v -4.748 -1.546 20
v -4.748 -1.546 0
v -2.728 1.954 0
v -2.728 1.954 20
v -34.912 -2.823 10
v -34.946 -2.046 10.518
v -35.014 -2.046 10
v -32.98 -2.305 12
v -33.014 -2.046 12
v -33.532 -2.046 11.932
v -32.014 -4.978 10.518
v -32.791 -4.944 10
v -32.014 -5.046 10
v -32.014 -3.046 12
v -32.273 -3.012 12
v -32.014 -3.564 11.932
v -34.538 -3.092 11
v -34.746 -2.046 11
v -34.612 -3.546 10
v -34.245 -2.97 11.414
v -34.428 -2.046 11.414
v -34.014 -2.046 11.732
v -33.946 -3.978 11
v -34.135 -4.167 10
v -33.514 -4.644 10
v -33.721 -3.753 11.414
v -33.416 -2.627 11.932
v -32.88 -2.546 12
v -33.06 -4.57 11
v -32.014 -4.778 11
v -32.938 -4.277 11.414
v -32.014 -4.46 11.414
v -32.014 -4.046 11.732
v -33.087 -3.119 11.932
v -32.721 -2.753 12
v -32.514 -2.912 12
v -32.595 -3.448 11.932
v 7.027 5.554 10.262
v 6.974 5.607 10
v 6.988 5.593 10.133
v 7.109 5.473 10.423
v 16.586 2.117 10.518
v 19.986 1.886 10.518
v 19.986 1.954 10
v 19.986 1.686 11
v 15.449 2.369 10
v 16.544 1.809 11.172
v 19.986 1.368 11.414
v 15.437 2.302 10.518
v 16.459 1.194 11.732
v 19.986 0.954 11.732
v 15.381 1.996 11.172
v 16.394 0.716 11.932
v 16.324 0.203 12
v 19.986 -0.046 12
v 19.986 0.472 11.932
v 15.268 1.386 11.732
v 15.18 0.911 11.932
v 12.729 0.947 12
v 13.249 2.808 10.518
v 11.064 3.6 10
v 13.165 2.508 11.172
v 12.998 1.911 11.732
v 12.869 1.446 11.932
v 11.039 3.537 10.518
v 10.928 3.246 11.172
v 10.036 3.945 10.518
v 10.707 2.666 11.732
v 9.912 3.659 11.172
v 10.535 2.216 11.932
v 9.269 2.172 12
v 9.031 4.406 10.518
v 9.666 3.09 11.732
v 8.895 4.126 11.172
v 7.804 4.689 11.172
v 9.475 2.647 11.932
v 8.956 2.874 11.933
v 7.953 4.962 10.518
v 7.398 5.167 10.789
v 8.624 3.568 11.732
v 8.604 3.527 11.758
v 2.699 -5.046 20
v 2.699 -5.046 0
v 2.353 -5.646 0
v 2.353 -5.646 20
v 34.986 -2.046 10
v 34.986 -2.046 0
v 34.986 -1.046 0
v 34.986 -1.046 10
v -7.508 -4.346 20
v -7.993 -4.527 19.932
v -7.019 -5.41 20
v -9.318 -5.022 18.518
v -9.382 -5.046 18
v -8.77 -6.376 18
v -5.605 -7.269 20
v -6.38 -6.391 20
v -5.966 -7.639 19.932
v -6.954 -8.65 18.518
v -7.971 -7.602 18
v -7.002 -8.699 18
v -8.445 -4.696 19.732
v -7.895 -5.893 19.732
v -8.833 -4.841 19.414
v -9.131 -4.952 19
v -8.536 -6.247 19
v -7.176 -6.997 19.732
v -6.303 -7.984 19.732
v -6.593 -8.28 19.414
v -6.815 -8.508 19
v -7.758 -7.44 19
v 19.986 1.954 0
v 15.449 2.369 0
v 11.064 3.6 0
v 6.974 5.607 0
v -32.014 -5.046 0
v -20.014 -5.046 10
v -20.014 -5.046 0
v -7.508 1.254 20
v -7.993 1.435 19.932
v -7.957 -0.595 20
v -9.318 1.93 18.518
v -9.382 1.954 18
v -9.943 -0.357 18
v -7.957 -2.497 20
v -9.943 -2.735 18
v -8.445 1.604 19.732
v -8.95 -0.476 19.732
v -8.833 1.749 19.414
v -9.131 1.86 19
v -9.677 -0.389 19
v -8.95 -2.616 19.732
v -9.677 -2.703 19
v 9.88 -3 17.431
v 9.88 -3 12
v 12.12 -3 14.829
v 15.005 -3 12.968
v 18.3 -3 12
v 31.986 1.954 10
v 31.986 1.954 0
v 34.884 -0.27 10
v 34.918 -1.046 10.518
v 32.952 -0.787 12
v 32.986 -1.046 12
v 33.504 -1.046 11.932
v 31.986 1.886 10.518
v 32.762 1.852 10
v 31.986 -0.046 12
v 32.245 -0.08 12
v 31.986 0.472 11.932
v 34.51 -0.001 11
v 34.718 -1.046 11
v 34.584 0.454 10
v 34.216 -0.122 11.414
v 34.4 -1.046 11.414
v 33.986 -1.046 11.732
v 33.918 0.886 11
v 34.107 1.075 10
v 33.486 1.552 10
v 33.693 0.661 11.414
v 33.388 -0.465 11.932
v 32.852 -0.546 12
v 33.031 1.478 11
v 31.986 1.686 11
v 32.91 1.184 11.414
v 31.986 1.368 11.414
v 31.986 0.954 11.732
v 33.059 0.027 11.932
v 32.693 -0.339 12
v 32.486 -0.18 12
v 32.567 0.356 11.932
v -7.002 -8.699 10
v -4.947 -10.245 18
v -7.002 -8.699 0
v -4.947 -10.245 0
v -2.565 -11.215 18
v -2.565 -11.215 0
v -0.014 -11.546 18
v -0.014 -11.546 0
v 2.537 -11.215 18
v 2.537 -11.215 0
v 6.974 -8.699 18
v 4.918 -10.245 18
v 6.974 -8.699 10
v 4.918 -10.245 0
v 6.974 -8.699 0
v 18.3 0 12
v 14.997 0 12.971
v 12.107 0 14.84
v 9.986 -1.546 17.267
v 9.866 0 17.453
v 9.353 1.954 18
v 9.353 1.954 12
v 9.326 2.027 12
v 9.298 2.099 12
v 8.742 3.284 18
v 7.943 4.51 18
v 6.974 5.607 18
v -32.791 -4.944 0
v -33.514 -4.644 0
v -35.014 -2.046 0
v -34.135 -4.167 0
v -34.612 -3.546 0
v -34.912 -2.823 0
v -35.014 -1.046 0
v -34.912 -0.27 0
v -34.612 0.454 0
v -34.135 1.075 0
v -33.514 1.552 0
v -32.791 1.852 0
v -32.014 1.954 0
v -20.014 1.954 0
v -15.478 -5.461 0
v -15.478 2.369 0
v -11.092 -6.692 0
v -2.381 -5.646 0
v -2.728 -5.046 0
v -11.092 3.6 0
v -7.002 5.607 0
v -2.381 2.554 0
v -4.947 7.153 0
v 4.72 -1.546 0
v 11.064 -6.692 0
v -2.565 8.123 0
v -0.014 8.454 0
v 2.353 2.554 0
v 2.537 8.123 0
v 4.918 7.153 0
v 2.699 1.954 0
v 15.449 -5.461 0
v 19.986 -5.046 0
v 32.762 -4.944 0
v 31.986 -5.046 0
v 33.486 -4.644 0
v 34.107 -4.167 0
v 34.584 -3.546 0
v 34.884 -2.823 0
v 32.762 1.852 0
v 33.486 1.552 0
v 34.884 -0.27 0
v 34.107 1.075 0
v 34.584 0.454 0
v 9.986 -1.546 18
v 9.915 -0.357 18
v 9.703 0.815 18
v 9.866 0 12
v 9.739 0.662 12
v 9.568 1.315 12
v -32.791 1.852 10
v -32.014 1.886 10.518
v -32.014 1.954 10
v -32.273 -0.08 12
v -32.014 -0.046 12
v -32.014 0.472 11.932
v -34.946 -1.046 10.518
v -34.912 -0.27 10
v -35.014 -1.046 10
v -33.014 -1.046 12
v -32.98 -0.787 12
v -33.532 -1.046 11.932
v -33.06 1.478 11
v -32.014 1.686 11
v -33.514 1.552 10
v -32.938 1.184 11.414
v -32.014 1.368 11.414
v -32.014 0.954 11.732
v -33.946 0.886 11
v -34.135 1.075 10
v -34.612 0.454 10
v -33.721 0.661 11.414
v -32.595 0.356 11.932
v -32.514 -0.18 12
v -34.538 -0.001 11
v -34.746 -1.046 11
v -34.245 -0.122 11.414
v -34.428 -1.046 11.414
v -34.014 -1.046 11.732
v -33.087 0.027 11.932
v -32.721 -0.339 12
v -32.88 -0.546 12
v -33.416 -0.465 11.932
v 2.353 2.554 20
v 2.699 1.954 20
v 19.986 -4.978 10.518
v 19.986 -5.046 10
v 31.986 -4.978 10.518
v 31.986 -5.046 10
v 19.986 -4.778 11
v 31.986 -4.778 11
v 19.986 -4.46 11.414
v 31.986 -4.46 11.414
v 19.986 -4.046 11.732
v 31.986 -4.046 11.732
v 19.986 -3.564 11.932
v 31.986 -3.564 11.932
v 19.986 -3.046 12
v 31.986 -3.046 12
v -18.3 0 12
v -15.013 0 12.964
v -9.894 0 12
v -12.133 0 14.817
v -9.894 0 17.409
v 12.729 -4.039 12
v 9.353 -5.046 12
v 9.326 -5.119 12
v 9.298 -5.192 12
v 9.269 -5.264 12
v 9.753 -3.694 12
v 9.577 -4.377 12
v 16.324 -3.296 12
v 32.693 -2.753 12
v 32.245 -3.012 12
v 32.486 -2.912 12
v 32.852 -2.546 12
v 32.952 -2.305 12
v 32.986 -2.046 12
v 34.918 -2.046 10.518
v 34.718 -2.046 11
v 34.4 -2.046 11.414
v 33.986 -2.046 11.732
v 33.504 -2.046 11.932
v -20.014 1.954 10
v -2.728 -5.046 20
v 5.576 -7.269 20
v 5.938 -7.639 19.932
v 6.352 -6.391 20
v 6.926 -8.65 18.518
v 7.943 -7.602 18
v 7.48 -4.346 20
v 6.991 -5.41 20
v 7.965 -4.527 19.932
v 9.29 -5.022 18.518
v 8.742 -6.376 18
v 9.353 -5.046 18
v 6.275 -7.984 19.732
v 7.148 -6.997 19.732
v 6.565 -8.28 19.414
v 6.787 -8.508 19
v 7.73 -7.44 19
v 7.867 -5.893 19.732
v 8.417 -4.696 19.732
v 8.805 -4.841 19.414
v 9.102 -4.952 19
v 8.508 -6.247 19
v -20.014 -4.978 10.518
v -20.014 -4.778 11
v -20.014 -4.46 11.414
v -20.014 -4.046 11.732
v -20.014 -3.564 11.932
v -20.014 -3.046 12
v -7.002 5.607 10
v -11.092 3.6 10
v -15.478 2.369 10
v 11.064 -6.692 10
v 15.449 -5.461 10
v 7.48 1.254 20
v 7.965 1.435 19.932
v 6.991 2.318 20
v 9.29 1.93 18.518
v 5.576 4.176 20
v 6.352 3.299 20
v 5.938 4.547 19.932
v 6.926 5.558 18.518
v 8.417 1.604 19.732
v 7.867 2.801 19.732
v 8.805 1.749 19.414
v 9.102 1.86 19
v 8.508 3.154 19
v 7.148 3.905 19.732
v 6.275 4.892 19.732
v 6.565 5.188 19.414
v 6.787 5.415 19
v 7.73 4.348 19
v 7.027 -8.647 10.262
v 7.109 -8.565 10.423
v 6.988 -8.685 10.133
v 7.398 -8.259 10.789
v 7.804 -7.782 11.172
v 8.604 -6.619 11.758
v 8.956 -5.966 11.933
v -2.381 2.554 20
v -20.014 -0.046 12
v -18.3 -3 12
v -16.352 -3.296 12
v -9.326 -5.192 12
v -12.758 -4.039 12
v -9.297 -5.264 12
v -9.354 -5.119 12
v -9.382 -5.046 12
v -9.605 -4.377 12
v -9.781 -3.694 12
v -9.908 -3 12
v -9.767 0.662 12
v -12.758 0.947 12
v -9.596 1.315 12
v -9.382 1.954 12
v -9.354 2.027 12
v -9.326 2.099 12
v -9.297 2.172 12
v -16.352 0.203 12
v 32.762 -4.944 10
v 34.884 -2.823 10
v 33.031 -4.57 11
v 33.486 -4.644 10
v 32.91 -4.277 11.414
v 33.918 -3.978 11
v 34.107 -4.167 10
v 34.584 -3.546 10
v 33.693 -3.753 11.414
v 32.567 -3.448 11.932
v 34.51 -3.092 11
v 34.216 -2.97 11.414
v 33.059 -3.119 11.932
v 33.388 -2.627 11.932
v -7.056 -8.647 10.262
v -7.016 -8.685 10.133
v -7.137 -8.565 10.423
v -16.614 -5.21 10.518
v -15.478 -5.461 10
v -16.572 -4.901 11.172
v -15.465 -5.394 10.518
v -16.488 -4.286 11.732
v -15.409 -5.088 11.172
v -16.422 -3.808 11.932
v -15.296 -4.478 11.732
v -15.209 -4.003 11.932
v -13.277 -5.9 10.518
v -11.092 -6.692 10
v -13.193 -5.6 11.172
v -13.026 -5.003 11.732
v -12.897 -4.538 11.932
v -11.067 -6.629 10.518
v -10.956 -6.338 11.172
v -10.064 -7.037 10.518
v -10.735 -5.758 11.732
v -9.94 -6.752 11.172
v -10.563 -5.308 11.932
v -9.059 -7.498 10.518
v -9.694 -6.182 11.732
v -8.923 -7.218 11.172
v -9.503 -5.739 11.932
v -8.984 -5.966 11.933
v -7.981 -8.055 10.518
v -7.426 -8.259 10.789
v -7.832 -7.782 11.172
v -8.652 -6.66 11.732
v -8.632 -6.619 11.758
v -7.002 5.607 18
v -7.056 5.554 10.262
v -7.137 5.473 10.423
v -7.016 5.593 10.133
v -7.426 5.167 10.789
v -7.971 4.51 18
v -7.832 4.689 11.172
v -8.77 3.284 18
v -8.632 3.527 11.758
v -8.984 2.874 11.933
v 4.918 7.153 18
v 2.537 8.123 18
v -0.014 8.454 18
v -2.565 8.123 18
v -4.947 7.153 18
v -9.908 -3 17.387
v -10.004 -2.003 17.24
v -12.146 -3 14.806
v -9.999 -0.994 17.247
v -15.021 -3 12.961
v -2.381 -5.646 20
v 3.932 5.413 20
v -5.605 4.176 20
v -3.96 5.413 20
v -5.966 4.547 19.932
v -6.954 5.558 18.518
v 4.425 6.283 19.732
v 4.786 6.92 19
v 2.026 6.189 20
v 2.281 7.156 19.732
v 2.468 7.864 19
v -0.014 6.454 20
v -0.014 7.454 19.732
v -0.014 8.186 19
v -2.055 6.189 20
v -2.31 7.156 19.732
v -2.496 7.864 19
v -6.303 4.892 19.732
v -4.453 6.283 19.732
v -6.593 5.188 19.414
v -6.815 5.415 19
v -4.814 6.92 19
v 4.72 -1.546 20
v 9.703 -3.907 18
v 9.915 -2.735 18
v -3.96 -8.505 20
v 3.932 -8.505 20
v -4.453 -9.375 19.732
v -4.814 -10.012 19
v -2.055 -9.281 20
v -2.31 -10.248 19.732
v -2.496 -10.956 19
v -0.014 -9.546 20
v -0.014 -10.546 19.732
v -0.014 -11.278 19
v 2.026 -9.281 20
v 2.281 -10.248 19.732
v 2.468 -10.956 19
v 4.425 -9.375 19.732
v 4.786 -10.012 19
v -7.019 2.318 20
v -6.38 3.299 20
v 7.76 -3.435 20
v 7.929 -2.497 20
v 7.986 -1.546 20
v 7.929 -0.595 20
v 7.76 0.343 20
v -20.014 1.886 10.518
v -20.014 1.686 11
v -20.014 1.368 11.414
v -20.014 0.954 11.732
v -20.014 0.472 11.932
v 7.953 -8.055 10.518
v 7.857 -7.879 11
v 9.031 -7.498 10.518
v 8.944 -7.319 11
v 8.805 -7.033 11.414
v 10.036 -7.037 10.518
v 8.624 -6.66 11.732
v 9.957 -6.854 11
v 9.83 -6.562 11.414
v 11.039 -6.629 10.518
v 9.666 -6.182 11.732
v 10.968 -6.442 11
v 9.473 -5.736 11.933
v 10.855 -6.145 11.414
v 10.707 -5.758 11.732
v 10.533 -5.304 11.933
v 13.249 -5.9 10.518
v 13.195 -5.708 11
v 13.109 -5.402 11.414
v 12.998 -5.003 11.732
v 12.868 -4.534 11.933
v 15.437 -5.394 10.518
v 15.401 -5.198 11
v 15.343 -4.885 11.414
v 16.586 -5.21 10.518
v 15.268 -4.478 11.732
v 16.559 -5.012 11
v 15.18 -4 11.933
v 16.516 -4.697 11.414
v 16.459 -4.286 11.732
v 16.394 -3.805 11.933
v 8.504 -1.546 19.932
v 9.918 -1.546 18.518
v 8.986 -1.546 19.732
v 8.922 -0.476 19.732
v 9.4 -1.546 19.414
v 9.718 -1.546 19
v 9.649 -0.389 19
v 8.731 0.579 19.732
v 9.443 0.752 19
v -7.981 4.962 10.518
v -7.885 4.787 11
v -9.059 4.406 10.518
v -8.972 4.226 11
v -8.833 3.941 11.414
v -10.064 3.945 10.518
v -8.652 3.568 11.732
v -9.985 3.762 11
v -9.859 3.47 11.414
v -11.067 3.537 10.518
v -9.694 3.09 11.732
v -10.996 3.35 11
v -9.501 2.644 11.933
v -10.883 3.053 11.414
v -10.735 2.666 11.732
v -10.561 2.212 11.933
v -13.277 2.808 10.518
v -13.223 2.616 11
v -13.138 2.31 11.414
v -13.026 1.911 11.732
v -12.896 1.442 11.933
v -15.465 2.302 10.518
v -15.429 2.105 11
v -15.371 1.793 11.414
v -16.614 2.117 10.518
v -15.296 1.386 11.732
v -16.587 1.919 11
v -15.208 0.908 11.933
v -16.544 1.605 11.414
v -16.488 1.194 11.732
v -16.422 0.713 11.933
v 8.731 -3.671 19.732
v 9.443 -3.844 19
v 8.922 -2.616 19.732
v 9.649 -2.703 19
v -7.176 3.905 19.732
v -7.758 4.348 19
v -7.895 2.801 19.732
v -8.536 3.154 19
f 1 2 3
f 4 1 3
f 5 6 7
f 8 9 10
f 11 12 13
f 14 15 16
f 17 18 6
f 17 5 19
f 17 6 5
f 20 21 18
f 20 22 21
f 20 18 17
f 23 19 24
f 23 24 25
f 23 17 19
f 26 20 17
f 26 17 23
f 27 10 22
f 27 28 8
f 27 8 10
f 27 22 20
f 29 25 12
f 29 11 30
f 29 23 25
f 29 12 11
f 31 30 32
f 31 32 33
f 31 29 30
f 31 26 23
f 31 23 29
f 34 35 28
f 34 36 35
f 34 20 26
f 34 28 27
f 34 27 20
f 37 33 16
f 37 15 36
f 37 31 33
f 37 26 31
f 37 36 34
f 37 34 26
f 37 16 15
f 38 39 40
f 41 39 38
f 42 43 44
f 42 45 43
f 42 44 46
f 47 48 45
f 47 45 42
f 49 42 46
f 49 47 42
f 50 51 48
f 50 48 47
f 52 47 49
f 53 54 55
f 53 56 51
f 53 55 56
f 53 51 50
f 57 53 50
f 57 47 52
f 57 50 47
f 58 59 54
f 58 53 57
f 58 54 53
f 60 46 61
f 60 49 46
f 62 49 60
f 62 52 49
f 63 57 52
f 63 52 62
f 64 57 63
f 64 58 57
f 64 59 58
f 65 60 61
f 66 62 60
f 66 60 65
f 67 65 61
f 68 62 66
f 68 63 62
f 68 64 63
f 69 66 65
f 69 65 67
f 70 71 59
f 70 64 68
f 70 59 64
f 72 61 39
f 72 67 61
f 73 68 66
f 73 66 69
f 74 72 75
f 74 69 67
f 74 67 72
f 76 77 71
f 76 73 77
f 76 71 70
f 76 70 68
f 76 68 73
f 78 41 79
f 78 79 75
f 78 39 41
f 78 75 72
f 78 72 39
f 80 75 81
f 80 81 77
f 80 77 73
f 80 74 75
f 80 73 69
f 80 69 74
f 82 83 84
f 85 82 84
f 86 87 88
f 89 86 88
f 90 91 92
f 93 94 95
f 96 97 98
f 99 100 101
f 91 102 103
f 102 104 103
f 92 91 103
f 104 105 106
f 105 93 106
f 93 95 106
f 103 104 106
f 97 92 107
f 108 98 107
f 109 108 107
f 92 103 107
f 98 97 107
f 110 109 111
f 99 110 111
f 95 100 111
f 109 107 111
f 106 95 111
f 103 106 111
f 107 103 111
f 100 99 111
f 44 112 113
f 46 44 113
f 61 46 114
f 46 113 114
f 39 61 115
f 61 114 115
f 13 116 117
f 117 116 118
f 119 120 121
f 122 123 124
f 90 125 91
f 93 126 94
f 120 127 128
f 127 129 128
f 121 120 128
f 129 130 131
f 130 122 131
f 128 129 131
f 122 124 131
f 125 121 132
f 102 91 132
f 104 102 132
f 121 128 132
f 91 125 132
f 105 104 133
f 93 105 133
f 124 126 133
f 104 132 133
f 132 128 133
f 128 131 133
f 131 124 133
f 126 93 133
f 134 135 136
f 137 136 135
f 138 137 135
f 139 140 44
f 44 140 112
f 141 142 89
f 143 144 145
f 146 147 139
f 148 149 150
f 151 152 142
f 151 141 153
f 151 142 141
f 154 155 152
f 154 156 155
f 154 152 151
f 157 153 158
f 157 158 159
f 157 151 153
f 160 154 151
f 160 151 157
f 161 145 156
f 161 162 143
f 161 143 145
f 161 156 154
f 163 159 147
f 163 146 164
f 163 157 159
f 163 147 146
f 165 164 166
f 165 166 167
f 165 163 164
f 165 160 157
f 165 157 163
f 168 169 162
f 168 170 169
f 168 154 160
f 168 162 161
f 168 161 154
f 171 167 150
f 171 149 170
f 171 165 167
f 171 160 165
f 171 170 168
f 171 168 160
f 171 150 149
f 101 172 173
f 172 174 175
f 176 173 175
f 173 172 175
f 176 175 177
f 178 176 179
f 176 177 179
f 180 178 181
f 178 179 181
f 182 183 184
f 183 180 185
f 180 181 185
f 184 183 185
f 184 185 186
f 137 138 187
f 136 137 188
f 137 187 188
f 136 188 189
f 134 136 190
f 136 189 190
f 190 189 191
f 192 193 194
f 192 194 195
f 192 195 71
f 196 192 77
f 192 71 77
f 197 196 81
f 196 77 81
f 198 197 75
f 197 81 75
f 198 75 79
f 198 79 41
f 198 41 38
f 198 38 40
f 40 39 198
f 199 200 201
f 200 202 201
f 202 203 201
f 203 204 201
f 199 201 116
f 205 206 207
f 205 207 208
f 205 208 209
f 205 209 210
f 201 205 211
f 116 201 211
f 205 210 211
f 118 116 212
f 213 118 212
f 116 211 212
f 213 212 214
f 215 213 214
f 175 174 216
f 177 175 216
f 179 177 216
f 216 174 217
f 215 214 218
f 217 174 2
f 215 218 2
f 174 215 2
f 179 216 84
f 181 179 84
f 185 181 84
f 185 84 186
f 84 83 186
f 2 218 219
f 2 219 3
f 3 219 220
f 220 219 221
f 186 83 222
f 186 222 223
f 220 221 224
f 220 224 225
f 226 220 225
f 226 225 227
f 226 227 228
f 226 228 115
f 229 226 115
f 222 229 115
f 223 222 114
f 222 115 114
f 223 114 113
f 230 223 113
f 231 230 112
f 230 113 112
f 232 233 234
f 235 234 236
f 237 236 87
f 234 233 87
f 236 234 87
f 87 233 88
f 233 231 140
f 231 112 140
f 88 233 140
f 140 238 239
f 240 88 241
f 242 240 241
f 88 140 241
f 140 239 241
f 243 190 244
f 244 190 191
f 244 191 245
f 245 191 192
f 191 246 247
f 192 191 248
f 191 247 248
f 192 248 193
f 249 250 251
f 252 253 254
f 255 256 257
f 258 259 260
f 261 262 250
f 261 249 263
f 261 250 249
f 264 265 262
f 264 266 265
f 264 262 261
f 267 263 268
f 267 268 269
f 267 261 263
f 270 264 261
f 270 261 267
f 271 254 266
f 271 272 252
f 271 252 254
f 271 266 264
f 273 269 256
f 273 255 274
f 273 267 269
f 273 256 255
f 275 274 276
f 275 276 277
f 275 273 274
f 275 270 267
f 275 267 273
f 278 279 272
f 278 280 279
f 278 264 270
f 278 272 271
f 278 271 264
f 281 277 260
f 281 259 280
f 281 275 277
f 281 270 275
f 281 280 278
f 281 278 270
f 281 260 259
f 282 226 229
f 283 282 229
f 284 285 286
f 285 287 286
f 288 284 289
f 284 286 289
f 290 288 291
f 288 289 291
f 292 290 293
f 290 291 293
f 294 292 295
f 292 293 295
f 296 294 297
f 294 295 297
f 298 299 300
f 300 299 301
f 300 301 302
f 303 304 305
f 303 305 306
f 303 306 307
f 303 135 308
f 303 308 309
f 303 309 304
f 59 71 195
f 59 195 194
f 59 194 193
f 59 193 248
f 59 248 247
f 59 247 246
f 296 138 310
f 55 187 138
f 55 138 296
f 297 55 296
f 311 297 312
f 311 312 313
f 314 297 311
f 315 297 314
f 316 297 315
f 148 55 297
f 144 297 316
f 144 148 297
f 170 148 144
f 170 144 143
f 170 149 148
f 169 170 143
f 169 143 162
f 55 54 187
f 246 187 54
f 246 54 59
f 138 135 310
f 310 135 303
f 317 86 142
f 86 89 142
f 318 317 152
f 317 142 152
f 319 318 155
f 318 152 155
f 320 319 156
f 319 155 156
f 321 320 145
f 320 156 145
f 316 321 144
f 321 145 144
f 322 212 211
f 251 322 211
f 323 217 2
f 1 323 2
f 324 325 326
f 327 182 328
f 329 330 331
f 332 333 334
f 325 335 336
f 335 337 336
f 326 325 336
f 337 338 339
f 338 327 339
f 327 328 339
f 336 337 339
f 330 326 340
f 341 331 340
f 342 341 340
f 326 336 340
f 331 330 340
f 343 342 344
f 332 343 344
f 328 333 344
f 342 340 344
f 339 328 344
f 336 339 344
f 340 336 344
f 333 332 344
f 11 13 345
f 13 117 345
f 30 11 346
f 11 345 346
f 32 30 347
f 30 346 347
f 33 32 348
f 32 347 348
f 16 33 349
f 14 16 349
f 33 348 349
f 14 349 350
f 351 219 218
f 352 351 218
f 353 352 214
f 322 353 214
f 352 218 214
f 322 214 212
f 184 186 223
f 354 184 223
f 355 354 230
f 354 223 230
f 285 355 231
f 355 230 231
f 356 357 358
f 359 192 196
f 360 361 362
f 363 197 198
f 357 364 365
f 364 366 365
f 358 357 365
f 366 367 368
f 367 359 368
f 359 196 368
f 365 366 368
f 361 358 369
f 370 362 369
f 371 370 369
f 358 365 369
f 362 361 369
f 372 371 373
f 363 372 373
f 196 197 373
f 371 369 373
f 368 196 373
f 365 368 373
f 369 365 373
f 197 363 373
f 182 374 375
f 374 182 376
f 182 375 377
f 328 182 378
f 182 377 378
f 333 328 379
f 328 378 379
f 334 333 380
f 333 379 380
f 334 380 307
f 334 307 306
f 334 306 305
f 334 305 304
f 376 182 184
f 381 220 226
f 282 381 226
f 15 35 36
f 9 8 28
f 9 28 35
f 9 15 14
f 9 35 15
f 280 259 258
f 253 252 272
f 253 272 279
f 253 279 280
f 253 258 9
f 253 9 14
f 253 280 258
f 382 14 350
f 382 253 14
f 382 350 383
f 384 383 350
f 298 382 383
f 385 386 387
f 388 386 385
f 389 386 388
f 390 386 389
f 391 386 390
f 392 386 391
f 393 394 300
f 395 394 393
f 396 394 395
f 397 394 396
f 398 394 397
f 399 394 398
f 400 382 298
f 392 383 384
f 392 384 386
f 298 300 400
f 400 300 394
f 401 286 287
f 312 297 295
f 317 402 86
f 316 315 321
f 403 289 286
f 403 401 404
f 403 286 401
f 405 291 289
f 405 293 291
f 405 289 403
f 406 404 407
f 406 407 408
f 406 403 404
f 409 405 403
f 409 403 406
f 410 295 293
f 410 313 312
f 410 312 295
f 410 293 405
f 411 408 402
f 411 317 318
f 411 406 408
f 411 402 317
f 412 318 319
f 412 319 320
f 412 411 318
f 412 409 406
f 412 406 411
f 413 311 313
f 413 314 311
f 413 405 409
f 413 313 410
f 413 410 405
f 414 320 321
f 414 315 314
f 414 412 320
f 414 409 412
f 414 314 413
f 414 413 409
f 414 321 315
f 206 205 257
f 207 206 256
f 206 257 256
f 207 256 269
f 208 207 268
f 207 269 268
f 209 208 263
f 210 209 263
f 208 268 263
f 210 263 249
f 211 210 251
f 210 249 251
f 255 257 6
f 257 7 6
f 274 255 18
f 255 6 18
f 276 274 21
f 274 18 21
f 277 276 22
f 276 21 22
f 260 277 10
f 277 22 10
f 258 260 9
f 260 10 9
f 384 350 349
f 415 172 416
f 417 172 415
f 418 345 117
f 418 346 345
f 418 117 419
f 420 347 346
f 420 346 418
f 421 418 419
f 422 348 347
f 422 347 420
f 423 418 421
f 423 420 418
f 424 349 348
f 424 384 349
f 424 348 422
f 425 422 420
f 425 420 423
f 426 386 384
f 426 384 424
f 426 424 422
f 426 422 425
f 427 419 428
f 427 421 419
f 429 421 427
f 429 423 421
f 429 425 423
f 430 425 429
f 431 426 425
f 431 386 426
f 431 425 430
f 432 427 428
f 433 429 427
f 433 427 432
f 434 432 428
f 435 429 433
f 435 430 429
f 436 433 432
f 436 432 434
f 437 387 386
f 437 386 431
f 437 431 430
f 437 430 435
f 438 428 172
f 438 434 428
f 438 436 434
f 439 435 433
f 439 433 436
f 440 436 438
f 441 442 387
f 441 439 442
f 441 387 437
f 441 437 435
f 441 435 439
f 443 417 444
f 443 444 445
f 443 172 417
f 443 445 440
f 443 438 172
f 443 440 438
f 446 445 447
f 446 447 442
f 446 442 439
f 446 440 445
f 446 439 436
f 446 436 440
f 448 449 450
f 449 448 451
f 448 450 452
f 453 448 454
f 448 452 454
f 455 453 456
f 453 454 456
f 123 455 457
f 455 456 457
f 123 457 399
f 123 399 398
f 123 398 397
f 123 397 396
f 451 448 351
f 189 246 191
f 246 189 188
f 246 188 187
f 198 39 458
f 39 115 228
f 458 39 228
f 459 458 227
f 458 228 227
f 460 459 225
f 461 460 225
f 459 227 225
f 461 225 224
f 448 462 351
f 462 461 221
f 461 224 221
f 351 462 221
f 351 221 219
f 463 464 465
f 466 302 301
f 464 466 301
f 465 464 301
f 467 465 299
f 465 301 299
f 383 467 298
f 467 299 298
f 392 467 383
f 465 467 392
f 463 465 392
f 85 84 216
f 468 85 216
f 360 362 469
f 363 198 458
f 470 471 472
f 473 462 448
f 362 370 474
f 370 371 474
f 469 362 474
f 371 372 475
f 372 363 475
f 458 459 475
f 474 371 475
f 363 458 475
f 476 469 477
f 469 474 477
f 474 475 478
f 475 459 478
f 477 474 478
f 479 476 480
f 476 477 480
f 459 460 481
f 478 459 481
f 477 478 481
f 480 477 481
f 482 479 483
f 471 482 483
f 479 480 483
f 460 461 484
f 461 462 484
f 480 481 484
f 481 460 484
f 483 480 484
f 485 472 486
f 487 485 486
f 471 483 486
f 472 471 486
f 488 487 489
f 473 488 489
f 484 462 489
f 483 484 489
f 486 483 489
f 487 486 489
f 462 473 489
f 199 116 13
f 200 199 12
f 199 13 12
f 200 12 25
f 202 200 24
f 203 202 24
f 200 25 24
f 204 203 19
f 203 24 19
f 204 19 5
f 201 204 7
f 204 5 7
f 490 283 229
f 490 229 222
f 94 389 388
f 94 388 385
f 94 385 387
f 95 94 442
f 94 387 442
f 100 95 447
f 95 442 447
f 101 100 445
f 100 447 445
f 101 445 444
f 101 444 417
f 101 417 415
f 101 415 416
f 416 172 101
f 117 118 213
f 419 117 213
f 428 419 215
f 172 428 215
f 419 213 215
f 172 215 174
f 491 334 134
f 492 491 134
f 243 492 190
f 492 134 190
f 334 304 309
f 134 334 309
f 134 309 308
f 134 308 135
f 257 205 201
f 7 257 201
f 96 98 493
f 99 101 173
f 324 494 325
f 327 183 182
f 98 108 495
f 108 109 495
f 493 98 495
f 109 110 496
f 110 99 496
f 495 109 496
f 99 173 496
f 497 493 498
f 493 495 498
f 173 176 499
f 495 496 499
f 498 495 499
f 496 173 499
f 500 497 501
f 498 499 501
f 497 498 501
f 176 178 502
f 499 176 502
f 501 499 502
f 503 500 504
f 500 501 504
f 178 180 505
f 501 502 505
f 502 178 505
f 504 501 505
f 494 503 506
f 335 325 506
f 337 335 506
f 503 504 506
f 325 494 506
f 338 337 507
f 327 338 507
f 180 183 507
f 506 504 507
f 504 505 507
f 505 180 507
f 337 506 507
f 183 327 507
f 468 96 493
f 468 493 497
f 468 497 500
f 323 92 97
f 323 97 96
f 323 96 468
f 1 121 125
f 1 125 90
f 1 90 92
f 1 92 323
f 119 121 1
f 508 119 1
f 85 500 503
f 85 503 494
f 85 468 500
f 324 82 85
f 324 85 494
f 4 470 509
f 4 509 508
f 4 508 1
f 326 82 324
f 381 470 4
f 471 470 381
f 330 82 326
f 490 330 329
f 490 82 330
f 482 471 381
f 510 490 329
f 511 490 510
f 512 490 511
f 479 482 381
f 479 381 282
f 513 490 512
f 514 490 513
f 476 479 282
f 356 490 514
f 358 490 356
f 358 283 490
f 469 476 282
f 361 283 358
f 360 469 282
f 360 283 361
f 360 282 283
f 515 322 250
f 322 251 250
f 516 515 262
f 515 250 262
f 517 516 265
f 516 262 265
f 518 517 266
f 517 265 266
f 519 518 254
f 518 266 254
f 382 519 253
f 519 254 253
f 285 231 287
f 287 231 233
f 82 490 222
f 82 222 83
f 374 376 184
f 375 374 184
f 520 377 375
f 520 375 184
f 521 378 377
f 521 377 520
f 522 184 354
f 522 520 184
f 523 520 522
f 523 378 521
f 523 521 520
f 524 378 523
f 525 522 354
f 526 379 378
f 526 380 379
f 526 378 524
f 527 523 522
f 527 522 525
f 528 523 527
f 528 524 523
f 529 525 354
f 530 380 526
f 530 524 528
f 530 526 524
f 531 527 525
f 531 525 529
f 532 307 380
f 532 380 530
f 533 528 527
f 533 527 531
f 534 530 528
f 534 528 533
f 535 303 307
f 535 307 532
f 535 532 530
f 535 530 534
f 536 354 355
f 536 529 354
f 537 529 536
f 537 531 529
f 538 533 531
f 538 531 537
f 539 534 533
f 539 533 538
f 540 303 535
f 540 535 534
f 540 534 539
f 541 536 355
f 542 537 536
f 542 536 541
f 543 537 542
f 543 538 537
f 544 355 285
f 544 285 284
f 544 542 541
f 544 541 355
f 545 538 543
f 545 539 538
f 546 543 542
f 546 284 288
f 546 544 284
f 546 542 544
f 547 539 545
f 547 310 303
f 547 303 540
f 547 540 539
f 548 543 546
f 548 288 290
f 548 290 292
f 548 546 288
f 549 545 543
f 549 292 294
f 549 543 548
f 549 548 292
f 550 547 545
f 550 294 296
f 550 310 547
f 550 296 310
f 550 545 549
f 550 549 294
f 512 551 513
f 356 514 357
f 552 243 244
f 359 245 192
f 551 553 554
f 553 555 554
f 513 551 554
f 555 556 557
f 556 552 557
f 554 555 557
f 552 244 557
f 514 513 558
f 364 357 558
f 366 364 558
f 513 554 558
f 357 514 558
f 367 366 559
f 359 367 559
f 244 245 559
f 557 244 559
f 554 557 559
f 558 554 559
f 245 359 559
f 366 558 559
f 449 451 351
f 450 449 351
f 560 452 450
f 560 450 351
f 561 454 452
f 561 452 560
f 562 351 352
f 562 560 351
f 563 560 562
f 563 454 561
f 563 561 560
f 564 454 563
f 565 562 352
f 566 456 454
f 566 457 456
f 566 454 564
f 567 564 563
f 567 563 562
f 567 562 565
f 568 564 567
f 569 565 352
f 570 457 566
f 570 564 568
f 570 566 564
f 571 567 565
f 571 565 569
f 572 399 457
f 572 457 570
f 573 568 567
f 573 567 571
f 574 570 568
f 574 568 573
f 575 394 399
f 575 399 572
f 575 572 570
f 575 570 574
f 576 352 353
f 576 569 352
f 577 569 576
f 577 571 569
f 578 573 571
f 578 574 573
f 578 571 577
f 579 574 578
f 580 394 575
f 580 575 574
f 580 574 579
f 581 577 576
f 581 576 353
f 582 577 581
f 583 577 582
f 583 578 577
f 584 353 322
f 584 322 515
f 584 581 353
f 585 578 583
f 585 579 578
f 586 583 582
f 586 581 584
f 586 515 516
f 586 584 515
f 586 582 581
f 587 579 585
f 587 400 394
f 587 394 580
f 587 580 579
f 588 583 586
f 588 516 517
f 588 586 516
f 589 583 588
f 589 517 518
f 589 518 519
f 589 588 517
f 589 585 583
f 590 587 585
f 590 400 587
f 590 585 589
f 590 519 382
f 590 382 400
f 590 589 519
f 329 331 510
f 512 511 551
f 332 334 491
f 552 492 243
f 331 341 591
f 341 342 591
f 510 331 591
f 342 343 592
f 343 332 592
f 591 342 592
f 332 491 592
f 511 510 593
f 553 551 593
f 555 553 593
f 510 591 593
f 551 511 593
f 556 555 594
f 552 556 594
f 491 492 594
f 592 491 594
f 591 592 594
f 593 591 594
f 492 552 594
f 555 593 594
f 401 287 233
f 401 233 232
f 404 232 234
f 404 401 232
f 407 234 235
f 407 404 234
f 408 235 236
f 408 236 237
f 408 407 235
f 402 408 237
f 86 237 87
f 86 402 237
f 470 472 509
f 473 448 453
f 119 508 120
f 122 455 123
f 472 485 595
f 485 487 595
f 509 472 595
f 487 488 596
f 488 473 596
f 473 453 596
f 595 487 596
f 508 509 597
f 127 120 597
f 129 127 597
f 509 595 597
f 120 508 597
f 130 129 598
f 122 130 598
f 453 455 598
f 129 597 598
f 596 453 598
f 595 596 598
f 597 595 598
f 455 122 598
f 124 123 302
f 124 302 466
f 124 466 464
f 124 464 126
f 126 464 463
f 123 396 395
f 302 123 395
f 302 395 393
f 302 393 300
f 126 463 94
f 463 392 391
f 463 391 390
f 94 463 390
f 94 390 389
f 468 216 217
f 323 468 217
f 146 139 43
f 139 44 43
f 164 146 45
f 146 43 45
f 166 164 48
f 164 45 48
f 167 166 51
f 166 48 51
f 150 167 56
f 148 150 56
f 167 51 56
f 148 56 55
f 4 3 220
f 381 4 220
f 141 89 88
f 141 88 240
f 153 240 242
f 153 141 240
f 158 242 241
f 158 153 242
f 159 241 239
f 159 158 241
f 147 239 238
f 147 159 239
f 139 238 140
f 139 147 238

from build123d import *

# Parameters (mm, degrees)
F1_DEPTH = 20
F2_DEPTH = 12
F3_R     = 3
F4_R     = 2
F6_DEPTH = 3


with BuildPart() as f1:
    # F0 (on Top) → F1 (new body)
    with BuildSketch(Plane.XY):
        with BuildLine():
            Line((-2.7276199649, -5.0460615367), (-9.3815706973, -5.0460615367))
            ThreePointArc((-9.3815706973, -5.0460615367), (-8.3933511583, -7.0038733026), (-7.002121491, -8.6991858936))
            ThreePointArc((-7.002121491, -8.6991858936), (-0.0140736997, -11.5460615367), (6.9739740916, -8.6991858936))
            ThreePointArc((6.9739740916, -8.6991858936), (8.3652037588, -7.0038733026), (9.3534232979, -5.0460615367))
            Line((9.3534232979, -5.0460615367), (2.6994725655, -5.0460615367))
            Line((2.6994725655, -5.0460615367), (2.353062404, -5.6460615367))
            Line((2.353062404, -5.6460615367), (-2.3812098034, -5.6460615367))
            Line((-2.3812098034, -5.6460615367), (-2.7276199649, -5.0460615367))
        make_face()
        with BuildLine():
            Line((-2.7276199649, 1.9539384633), (-9.3815706973, 1.9539384633))
            ThreePointArc((-9.3815706973, 1.9539384633), (-10.0140736997, -1.5460615367), (-9.3815706973, -5.0460615367))
            Line((-9.3815706973, -5.0460615367), (-2.7276199649, -5.0460615367))
            Line((-2.7276199649, -5.0460615367), (-4.7483459071, -1.5460615367))
            Line((-4.7483459071, -1.5460615367), (-2.7276199649, 1.9539384633))
        make_face()
        with BuildLine():
            ThreePointArc((-7.002121491, 5.6070628203), (-8.3933511583, 3.9117502293), (-9.3815706973, 1.9539384633))
            Line((-9.3815706973, 1.9539384633), (-2.7276199649, 1.9539384633))
            Line((-2.7276199649, 1.9539384633), (-2.3812098034, 2.5539384633))
            Line((-2.3812098034, 2.5539384633), (2.353062404, 2.5539384633))
            Line((2.353062404, 2.5539384633), (2.6994725655, 1.9539384633))
            Line((2.6994725655, 1.9539384633), (9.3534232979, 1.9539384633))
            ThreePointArc((9.3534232979, 1.9539384633), (8.3652037588, 3.9117502293), (6.9739740916, 5.6070628203))
            ThreePointArc((6.9739740916, 5.6070628203), (-0.0140736997, 8.4539384633), (-7.002121491, 5.6070628203))
        make_face()
        with BuildLine():
            Line((9.3534232979, 1.9539384633), (2.6994725655, 1.9539384633))
            Line((2.6994725655, 1.9539384633), (4.7201985076, -1.5460615367))
            Line((4.7201985076, -1.5460615367), (2.6994725655, -5.0460615367))
            Line((2.6994725655, -5.0460615367), (9.3534232979, -5.0460615367))
            ThreePointArc((9.3534232979, -5.0460615367), (9.8265301937, -3.3244076818), (9.9859263003, -1.5460615367))
            ThreePointArc((9.9859263003, -1.5460615367), (9.8265301937, 0.2322846085), (9.3534232979, 1.9539384633))
        make_face()
    extrude(amount=F1_DEPTH)

    # F0 (on Top) → F2 (join)
    with BuildSketch(Plane.XY):
        with BuildLine():
            ThreePointArc((9.3534232979, -5.0460615367), (8.3652037588, -7.0038733026), (6.9739740916, -8.6991858936))
            ThreePointArc((6.9739740916, -8.6991858936), (13.2284079346, -5.9766630079), (19.9859263003, -5.0460615367))
            Line((19.9859263003, -5.0460615367), (9.3534232979, -5.0460615367))
        make_face()
        with BuildLine():
            ThreePointArc((19.9859263003, 1.9539384633), (13.2284079346, 2.8845399345), (6.9739740916, 5.6070628203))
            ThreePointArc((6.9739740916, 5.6070628203), (8.3652037588, 3.9117502293), (9.3534232979, 1.9539384633))
            Line((9.3534232979, 1.9539384633), (19.9859263003, 1.9539384633))
        make_face()
        with BuildLine():
            Line((19.9859263003, 1.9539384633), (9.3534232979, 1.9539384633))
            ThreePointArc((9.3534232979, 1.9539384633), (9.8265301937, 0.2322846085), (9.9859263003, -1.5460615367))
            ThreePointArc((9.9859263003, -1.5460615367), (9.8265301937, -3.3244076818), (9.3534232979, -5.0460615367))
            Line((9.3534232979, -5.0460615367), (19.9859263003, -5.0460615367))
            Line((19.9859263003, -5.0460615367), (34.9859263003, -5.0460615367))
            Line((34.9859263003, -5.0460615367), (34.9859263003, 1.9539384633))
            Line((34.9859263003, 1.9539384633), (19.9859263003, 1.9539384633))
        make_face()
        with BuildLine():
            Line((-9.3815706973, -5.0460615367), (-20.0140736997, -5.0460615367))
            ThreePointArc((-20.0140736997, -5.0460615367), (-13.2565553341, -5.9766630079), (-7.002121491, -8.6991858936))
            ThreePointArc((-7.002121491, -8.6991858936), (-8.3933511583, -7.0038733026), (-9.3815706973, -5.0460615367))
        make_face()
        with BuildLine():
            Line((-20.0140736997, 1.9539384633), (-35.0140736997, 1.9539384633))
            Line((-35.0140736997, 1.9539384633), (-35.0140736997, -5.0460615367))
            Line((-35.0140736997, -5.0460615367), (-20.0140736997, -5.0460615367))
            Line((-20.0140736997, -5.0460615367), (-9.3815706973, -5.0460615367))
            ThreePointArc((-9.3815706973, -5.0460615367), (-10.0140736997, -1.5460615367), (-9.3815706973, 1.9539384633))
            Line((-9.3815706973, 1.9539384633), (-20.0140736997, 1.9539384633))
        make_face()
        with BuildLine():
            ThreePointArc((-7.002121491, 5.6070628203), (-13.2565553341, 2.8845399345), (-20.0140736997, 1.9539384633))
            Line((-20.0140736997, 1.9539384633), (-9.3815706973, 1.9539384633))
            ThreePointArc((-9.3815706973, 1.9539384633), (-8.3933511583, 3.9117502293), (-7.002121491, 5.6070628203))
        make_face()
    extrude(amount=F2_DEPTH)

    # F3
    f3_edges = [f1.edges().sort_by_distance(p)[0] for p in [
        (-35.014074, 1.953938, 6),
        (-35.014074, -5.046062, 6),
        (34.985926, -5.046062, 6),
        (34.985926, 1.953938, 6),
    ]]
    fillet(f3_edges, radius=F3_R)

    # F4
    f4_edges = [f1.edges().sort_by_distance(p)[0] for p in [
        (-26.014074, -5.046062, 12),
        (13.228408, -5.976663, 12),
        (-9.381571, 1.953938, 20),
    ]]
    fillet(f4_edges, radius=F4_R)

    # F5 (on Front) → F6 (join)
    with BuildSketch(Plane.XZ):
        with BuildLine():
            ThreePointArc((-9.5652169443, 17.9530884136), (-13.9630221988, 13.5080377527), (-19.999999553, 11.8789058179))
            Line((-19.999999553, 11.8789058179), (-9.5652169443, 11.8789058179))
            Line((-9.5652169443, 11.8789058179), (-9.5652169443, 17.9530884136))
        make_face()
        with BuildLine():
            ThreePointArc((20.000000447, 11.8789058179), (13.9630230929, 13.5080377527), (9.5652178383, 17.9530884136))
            Line((9.5652178383, 17.9530884136), (9.5652178383, 11.8789058179))
            Line((9.5652178383, 11.8789058179), (20.000000447, 11.8789058179))
        make_face()
    extrude(amount=F6_DEPTH)


solid = f1.part
